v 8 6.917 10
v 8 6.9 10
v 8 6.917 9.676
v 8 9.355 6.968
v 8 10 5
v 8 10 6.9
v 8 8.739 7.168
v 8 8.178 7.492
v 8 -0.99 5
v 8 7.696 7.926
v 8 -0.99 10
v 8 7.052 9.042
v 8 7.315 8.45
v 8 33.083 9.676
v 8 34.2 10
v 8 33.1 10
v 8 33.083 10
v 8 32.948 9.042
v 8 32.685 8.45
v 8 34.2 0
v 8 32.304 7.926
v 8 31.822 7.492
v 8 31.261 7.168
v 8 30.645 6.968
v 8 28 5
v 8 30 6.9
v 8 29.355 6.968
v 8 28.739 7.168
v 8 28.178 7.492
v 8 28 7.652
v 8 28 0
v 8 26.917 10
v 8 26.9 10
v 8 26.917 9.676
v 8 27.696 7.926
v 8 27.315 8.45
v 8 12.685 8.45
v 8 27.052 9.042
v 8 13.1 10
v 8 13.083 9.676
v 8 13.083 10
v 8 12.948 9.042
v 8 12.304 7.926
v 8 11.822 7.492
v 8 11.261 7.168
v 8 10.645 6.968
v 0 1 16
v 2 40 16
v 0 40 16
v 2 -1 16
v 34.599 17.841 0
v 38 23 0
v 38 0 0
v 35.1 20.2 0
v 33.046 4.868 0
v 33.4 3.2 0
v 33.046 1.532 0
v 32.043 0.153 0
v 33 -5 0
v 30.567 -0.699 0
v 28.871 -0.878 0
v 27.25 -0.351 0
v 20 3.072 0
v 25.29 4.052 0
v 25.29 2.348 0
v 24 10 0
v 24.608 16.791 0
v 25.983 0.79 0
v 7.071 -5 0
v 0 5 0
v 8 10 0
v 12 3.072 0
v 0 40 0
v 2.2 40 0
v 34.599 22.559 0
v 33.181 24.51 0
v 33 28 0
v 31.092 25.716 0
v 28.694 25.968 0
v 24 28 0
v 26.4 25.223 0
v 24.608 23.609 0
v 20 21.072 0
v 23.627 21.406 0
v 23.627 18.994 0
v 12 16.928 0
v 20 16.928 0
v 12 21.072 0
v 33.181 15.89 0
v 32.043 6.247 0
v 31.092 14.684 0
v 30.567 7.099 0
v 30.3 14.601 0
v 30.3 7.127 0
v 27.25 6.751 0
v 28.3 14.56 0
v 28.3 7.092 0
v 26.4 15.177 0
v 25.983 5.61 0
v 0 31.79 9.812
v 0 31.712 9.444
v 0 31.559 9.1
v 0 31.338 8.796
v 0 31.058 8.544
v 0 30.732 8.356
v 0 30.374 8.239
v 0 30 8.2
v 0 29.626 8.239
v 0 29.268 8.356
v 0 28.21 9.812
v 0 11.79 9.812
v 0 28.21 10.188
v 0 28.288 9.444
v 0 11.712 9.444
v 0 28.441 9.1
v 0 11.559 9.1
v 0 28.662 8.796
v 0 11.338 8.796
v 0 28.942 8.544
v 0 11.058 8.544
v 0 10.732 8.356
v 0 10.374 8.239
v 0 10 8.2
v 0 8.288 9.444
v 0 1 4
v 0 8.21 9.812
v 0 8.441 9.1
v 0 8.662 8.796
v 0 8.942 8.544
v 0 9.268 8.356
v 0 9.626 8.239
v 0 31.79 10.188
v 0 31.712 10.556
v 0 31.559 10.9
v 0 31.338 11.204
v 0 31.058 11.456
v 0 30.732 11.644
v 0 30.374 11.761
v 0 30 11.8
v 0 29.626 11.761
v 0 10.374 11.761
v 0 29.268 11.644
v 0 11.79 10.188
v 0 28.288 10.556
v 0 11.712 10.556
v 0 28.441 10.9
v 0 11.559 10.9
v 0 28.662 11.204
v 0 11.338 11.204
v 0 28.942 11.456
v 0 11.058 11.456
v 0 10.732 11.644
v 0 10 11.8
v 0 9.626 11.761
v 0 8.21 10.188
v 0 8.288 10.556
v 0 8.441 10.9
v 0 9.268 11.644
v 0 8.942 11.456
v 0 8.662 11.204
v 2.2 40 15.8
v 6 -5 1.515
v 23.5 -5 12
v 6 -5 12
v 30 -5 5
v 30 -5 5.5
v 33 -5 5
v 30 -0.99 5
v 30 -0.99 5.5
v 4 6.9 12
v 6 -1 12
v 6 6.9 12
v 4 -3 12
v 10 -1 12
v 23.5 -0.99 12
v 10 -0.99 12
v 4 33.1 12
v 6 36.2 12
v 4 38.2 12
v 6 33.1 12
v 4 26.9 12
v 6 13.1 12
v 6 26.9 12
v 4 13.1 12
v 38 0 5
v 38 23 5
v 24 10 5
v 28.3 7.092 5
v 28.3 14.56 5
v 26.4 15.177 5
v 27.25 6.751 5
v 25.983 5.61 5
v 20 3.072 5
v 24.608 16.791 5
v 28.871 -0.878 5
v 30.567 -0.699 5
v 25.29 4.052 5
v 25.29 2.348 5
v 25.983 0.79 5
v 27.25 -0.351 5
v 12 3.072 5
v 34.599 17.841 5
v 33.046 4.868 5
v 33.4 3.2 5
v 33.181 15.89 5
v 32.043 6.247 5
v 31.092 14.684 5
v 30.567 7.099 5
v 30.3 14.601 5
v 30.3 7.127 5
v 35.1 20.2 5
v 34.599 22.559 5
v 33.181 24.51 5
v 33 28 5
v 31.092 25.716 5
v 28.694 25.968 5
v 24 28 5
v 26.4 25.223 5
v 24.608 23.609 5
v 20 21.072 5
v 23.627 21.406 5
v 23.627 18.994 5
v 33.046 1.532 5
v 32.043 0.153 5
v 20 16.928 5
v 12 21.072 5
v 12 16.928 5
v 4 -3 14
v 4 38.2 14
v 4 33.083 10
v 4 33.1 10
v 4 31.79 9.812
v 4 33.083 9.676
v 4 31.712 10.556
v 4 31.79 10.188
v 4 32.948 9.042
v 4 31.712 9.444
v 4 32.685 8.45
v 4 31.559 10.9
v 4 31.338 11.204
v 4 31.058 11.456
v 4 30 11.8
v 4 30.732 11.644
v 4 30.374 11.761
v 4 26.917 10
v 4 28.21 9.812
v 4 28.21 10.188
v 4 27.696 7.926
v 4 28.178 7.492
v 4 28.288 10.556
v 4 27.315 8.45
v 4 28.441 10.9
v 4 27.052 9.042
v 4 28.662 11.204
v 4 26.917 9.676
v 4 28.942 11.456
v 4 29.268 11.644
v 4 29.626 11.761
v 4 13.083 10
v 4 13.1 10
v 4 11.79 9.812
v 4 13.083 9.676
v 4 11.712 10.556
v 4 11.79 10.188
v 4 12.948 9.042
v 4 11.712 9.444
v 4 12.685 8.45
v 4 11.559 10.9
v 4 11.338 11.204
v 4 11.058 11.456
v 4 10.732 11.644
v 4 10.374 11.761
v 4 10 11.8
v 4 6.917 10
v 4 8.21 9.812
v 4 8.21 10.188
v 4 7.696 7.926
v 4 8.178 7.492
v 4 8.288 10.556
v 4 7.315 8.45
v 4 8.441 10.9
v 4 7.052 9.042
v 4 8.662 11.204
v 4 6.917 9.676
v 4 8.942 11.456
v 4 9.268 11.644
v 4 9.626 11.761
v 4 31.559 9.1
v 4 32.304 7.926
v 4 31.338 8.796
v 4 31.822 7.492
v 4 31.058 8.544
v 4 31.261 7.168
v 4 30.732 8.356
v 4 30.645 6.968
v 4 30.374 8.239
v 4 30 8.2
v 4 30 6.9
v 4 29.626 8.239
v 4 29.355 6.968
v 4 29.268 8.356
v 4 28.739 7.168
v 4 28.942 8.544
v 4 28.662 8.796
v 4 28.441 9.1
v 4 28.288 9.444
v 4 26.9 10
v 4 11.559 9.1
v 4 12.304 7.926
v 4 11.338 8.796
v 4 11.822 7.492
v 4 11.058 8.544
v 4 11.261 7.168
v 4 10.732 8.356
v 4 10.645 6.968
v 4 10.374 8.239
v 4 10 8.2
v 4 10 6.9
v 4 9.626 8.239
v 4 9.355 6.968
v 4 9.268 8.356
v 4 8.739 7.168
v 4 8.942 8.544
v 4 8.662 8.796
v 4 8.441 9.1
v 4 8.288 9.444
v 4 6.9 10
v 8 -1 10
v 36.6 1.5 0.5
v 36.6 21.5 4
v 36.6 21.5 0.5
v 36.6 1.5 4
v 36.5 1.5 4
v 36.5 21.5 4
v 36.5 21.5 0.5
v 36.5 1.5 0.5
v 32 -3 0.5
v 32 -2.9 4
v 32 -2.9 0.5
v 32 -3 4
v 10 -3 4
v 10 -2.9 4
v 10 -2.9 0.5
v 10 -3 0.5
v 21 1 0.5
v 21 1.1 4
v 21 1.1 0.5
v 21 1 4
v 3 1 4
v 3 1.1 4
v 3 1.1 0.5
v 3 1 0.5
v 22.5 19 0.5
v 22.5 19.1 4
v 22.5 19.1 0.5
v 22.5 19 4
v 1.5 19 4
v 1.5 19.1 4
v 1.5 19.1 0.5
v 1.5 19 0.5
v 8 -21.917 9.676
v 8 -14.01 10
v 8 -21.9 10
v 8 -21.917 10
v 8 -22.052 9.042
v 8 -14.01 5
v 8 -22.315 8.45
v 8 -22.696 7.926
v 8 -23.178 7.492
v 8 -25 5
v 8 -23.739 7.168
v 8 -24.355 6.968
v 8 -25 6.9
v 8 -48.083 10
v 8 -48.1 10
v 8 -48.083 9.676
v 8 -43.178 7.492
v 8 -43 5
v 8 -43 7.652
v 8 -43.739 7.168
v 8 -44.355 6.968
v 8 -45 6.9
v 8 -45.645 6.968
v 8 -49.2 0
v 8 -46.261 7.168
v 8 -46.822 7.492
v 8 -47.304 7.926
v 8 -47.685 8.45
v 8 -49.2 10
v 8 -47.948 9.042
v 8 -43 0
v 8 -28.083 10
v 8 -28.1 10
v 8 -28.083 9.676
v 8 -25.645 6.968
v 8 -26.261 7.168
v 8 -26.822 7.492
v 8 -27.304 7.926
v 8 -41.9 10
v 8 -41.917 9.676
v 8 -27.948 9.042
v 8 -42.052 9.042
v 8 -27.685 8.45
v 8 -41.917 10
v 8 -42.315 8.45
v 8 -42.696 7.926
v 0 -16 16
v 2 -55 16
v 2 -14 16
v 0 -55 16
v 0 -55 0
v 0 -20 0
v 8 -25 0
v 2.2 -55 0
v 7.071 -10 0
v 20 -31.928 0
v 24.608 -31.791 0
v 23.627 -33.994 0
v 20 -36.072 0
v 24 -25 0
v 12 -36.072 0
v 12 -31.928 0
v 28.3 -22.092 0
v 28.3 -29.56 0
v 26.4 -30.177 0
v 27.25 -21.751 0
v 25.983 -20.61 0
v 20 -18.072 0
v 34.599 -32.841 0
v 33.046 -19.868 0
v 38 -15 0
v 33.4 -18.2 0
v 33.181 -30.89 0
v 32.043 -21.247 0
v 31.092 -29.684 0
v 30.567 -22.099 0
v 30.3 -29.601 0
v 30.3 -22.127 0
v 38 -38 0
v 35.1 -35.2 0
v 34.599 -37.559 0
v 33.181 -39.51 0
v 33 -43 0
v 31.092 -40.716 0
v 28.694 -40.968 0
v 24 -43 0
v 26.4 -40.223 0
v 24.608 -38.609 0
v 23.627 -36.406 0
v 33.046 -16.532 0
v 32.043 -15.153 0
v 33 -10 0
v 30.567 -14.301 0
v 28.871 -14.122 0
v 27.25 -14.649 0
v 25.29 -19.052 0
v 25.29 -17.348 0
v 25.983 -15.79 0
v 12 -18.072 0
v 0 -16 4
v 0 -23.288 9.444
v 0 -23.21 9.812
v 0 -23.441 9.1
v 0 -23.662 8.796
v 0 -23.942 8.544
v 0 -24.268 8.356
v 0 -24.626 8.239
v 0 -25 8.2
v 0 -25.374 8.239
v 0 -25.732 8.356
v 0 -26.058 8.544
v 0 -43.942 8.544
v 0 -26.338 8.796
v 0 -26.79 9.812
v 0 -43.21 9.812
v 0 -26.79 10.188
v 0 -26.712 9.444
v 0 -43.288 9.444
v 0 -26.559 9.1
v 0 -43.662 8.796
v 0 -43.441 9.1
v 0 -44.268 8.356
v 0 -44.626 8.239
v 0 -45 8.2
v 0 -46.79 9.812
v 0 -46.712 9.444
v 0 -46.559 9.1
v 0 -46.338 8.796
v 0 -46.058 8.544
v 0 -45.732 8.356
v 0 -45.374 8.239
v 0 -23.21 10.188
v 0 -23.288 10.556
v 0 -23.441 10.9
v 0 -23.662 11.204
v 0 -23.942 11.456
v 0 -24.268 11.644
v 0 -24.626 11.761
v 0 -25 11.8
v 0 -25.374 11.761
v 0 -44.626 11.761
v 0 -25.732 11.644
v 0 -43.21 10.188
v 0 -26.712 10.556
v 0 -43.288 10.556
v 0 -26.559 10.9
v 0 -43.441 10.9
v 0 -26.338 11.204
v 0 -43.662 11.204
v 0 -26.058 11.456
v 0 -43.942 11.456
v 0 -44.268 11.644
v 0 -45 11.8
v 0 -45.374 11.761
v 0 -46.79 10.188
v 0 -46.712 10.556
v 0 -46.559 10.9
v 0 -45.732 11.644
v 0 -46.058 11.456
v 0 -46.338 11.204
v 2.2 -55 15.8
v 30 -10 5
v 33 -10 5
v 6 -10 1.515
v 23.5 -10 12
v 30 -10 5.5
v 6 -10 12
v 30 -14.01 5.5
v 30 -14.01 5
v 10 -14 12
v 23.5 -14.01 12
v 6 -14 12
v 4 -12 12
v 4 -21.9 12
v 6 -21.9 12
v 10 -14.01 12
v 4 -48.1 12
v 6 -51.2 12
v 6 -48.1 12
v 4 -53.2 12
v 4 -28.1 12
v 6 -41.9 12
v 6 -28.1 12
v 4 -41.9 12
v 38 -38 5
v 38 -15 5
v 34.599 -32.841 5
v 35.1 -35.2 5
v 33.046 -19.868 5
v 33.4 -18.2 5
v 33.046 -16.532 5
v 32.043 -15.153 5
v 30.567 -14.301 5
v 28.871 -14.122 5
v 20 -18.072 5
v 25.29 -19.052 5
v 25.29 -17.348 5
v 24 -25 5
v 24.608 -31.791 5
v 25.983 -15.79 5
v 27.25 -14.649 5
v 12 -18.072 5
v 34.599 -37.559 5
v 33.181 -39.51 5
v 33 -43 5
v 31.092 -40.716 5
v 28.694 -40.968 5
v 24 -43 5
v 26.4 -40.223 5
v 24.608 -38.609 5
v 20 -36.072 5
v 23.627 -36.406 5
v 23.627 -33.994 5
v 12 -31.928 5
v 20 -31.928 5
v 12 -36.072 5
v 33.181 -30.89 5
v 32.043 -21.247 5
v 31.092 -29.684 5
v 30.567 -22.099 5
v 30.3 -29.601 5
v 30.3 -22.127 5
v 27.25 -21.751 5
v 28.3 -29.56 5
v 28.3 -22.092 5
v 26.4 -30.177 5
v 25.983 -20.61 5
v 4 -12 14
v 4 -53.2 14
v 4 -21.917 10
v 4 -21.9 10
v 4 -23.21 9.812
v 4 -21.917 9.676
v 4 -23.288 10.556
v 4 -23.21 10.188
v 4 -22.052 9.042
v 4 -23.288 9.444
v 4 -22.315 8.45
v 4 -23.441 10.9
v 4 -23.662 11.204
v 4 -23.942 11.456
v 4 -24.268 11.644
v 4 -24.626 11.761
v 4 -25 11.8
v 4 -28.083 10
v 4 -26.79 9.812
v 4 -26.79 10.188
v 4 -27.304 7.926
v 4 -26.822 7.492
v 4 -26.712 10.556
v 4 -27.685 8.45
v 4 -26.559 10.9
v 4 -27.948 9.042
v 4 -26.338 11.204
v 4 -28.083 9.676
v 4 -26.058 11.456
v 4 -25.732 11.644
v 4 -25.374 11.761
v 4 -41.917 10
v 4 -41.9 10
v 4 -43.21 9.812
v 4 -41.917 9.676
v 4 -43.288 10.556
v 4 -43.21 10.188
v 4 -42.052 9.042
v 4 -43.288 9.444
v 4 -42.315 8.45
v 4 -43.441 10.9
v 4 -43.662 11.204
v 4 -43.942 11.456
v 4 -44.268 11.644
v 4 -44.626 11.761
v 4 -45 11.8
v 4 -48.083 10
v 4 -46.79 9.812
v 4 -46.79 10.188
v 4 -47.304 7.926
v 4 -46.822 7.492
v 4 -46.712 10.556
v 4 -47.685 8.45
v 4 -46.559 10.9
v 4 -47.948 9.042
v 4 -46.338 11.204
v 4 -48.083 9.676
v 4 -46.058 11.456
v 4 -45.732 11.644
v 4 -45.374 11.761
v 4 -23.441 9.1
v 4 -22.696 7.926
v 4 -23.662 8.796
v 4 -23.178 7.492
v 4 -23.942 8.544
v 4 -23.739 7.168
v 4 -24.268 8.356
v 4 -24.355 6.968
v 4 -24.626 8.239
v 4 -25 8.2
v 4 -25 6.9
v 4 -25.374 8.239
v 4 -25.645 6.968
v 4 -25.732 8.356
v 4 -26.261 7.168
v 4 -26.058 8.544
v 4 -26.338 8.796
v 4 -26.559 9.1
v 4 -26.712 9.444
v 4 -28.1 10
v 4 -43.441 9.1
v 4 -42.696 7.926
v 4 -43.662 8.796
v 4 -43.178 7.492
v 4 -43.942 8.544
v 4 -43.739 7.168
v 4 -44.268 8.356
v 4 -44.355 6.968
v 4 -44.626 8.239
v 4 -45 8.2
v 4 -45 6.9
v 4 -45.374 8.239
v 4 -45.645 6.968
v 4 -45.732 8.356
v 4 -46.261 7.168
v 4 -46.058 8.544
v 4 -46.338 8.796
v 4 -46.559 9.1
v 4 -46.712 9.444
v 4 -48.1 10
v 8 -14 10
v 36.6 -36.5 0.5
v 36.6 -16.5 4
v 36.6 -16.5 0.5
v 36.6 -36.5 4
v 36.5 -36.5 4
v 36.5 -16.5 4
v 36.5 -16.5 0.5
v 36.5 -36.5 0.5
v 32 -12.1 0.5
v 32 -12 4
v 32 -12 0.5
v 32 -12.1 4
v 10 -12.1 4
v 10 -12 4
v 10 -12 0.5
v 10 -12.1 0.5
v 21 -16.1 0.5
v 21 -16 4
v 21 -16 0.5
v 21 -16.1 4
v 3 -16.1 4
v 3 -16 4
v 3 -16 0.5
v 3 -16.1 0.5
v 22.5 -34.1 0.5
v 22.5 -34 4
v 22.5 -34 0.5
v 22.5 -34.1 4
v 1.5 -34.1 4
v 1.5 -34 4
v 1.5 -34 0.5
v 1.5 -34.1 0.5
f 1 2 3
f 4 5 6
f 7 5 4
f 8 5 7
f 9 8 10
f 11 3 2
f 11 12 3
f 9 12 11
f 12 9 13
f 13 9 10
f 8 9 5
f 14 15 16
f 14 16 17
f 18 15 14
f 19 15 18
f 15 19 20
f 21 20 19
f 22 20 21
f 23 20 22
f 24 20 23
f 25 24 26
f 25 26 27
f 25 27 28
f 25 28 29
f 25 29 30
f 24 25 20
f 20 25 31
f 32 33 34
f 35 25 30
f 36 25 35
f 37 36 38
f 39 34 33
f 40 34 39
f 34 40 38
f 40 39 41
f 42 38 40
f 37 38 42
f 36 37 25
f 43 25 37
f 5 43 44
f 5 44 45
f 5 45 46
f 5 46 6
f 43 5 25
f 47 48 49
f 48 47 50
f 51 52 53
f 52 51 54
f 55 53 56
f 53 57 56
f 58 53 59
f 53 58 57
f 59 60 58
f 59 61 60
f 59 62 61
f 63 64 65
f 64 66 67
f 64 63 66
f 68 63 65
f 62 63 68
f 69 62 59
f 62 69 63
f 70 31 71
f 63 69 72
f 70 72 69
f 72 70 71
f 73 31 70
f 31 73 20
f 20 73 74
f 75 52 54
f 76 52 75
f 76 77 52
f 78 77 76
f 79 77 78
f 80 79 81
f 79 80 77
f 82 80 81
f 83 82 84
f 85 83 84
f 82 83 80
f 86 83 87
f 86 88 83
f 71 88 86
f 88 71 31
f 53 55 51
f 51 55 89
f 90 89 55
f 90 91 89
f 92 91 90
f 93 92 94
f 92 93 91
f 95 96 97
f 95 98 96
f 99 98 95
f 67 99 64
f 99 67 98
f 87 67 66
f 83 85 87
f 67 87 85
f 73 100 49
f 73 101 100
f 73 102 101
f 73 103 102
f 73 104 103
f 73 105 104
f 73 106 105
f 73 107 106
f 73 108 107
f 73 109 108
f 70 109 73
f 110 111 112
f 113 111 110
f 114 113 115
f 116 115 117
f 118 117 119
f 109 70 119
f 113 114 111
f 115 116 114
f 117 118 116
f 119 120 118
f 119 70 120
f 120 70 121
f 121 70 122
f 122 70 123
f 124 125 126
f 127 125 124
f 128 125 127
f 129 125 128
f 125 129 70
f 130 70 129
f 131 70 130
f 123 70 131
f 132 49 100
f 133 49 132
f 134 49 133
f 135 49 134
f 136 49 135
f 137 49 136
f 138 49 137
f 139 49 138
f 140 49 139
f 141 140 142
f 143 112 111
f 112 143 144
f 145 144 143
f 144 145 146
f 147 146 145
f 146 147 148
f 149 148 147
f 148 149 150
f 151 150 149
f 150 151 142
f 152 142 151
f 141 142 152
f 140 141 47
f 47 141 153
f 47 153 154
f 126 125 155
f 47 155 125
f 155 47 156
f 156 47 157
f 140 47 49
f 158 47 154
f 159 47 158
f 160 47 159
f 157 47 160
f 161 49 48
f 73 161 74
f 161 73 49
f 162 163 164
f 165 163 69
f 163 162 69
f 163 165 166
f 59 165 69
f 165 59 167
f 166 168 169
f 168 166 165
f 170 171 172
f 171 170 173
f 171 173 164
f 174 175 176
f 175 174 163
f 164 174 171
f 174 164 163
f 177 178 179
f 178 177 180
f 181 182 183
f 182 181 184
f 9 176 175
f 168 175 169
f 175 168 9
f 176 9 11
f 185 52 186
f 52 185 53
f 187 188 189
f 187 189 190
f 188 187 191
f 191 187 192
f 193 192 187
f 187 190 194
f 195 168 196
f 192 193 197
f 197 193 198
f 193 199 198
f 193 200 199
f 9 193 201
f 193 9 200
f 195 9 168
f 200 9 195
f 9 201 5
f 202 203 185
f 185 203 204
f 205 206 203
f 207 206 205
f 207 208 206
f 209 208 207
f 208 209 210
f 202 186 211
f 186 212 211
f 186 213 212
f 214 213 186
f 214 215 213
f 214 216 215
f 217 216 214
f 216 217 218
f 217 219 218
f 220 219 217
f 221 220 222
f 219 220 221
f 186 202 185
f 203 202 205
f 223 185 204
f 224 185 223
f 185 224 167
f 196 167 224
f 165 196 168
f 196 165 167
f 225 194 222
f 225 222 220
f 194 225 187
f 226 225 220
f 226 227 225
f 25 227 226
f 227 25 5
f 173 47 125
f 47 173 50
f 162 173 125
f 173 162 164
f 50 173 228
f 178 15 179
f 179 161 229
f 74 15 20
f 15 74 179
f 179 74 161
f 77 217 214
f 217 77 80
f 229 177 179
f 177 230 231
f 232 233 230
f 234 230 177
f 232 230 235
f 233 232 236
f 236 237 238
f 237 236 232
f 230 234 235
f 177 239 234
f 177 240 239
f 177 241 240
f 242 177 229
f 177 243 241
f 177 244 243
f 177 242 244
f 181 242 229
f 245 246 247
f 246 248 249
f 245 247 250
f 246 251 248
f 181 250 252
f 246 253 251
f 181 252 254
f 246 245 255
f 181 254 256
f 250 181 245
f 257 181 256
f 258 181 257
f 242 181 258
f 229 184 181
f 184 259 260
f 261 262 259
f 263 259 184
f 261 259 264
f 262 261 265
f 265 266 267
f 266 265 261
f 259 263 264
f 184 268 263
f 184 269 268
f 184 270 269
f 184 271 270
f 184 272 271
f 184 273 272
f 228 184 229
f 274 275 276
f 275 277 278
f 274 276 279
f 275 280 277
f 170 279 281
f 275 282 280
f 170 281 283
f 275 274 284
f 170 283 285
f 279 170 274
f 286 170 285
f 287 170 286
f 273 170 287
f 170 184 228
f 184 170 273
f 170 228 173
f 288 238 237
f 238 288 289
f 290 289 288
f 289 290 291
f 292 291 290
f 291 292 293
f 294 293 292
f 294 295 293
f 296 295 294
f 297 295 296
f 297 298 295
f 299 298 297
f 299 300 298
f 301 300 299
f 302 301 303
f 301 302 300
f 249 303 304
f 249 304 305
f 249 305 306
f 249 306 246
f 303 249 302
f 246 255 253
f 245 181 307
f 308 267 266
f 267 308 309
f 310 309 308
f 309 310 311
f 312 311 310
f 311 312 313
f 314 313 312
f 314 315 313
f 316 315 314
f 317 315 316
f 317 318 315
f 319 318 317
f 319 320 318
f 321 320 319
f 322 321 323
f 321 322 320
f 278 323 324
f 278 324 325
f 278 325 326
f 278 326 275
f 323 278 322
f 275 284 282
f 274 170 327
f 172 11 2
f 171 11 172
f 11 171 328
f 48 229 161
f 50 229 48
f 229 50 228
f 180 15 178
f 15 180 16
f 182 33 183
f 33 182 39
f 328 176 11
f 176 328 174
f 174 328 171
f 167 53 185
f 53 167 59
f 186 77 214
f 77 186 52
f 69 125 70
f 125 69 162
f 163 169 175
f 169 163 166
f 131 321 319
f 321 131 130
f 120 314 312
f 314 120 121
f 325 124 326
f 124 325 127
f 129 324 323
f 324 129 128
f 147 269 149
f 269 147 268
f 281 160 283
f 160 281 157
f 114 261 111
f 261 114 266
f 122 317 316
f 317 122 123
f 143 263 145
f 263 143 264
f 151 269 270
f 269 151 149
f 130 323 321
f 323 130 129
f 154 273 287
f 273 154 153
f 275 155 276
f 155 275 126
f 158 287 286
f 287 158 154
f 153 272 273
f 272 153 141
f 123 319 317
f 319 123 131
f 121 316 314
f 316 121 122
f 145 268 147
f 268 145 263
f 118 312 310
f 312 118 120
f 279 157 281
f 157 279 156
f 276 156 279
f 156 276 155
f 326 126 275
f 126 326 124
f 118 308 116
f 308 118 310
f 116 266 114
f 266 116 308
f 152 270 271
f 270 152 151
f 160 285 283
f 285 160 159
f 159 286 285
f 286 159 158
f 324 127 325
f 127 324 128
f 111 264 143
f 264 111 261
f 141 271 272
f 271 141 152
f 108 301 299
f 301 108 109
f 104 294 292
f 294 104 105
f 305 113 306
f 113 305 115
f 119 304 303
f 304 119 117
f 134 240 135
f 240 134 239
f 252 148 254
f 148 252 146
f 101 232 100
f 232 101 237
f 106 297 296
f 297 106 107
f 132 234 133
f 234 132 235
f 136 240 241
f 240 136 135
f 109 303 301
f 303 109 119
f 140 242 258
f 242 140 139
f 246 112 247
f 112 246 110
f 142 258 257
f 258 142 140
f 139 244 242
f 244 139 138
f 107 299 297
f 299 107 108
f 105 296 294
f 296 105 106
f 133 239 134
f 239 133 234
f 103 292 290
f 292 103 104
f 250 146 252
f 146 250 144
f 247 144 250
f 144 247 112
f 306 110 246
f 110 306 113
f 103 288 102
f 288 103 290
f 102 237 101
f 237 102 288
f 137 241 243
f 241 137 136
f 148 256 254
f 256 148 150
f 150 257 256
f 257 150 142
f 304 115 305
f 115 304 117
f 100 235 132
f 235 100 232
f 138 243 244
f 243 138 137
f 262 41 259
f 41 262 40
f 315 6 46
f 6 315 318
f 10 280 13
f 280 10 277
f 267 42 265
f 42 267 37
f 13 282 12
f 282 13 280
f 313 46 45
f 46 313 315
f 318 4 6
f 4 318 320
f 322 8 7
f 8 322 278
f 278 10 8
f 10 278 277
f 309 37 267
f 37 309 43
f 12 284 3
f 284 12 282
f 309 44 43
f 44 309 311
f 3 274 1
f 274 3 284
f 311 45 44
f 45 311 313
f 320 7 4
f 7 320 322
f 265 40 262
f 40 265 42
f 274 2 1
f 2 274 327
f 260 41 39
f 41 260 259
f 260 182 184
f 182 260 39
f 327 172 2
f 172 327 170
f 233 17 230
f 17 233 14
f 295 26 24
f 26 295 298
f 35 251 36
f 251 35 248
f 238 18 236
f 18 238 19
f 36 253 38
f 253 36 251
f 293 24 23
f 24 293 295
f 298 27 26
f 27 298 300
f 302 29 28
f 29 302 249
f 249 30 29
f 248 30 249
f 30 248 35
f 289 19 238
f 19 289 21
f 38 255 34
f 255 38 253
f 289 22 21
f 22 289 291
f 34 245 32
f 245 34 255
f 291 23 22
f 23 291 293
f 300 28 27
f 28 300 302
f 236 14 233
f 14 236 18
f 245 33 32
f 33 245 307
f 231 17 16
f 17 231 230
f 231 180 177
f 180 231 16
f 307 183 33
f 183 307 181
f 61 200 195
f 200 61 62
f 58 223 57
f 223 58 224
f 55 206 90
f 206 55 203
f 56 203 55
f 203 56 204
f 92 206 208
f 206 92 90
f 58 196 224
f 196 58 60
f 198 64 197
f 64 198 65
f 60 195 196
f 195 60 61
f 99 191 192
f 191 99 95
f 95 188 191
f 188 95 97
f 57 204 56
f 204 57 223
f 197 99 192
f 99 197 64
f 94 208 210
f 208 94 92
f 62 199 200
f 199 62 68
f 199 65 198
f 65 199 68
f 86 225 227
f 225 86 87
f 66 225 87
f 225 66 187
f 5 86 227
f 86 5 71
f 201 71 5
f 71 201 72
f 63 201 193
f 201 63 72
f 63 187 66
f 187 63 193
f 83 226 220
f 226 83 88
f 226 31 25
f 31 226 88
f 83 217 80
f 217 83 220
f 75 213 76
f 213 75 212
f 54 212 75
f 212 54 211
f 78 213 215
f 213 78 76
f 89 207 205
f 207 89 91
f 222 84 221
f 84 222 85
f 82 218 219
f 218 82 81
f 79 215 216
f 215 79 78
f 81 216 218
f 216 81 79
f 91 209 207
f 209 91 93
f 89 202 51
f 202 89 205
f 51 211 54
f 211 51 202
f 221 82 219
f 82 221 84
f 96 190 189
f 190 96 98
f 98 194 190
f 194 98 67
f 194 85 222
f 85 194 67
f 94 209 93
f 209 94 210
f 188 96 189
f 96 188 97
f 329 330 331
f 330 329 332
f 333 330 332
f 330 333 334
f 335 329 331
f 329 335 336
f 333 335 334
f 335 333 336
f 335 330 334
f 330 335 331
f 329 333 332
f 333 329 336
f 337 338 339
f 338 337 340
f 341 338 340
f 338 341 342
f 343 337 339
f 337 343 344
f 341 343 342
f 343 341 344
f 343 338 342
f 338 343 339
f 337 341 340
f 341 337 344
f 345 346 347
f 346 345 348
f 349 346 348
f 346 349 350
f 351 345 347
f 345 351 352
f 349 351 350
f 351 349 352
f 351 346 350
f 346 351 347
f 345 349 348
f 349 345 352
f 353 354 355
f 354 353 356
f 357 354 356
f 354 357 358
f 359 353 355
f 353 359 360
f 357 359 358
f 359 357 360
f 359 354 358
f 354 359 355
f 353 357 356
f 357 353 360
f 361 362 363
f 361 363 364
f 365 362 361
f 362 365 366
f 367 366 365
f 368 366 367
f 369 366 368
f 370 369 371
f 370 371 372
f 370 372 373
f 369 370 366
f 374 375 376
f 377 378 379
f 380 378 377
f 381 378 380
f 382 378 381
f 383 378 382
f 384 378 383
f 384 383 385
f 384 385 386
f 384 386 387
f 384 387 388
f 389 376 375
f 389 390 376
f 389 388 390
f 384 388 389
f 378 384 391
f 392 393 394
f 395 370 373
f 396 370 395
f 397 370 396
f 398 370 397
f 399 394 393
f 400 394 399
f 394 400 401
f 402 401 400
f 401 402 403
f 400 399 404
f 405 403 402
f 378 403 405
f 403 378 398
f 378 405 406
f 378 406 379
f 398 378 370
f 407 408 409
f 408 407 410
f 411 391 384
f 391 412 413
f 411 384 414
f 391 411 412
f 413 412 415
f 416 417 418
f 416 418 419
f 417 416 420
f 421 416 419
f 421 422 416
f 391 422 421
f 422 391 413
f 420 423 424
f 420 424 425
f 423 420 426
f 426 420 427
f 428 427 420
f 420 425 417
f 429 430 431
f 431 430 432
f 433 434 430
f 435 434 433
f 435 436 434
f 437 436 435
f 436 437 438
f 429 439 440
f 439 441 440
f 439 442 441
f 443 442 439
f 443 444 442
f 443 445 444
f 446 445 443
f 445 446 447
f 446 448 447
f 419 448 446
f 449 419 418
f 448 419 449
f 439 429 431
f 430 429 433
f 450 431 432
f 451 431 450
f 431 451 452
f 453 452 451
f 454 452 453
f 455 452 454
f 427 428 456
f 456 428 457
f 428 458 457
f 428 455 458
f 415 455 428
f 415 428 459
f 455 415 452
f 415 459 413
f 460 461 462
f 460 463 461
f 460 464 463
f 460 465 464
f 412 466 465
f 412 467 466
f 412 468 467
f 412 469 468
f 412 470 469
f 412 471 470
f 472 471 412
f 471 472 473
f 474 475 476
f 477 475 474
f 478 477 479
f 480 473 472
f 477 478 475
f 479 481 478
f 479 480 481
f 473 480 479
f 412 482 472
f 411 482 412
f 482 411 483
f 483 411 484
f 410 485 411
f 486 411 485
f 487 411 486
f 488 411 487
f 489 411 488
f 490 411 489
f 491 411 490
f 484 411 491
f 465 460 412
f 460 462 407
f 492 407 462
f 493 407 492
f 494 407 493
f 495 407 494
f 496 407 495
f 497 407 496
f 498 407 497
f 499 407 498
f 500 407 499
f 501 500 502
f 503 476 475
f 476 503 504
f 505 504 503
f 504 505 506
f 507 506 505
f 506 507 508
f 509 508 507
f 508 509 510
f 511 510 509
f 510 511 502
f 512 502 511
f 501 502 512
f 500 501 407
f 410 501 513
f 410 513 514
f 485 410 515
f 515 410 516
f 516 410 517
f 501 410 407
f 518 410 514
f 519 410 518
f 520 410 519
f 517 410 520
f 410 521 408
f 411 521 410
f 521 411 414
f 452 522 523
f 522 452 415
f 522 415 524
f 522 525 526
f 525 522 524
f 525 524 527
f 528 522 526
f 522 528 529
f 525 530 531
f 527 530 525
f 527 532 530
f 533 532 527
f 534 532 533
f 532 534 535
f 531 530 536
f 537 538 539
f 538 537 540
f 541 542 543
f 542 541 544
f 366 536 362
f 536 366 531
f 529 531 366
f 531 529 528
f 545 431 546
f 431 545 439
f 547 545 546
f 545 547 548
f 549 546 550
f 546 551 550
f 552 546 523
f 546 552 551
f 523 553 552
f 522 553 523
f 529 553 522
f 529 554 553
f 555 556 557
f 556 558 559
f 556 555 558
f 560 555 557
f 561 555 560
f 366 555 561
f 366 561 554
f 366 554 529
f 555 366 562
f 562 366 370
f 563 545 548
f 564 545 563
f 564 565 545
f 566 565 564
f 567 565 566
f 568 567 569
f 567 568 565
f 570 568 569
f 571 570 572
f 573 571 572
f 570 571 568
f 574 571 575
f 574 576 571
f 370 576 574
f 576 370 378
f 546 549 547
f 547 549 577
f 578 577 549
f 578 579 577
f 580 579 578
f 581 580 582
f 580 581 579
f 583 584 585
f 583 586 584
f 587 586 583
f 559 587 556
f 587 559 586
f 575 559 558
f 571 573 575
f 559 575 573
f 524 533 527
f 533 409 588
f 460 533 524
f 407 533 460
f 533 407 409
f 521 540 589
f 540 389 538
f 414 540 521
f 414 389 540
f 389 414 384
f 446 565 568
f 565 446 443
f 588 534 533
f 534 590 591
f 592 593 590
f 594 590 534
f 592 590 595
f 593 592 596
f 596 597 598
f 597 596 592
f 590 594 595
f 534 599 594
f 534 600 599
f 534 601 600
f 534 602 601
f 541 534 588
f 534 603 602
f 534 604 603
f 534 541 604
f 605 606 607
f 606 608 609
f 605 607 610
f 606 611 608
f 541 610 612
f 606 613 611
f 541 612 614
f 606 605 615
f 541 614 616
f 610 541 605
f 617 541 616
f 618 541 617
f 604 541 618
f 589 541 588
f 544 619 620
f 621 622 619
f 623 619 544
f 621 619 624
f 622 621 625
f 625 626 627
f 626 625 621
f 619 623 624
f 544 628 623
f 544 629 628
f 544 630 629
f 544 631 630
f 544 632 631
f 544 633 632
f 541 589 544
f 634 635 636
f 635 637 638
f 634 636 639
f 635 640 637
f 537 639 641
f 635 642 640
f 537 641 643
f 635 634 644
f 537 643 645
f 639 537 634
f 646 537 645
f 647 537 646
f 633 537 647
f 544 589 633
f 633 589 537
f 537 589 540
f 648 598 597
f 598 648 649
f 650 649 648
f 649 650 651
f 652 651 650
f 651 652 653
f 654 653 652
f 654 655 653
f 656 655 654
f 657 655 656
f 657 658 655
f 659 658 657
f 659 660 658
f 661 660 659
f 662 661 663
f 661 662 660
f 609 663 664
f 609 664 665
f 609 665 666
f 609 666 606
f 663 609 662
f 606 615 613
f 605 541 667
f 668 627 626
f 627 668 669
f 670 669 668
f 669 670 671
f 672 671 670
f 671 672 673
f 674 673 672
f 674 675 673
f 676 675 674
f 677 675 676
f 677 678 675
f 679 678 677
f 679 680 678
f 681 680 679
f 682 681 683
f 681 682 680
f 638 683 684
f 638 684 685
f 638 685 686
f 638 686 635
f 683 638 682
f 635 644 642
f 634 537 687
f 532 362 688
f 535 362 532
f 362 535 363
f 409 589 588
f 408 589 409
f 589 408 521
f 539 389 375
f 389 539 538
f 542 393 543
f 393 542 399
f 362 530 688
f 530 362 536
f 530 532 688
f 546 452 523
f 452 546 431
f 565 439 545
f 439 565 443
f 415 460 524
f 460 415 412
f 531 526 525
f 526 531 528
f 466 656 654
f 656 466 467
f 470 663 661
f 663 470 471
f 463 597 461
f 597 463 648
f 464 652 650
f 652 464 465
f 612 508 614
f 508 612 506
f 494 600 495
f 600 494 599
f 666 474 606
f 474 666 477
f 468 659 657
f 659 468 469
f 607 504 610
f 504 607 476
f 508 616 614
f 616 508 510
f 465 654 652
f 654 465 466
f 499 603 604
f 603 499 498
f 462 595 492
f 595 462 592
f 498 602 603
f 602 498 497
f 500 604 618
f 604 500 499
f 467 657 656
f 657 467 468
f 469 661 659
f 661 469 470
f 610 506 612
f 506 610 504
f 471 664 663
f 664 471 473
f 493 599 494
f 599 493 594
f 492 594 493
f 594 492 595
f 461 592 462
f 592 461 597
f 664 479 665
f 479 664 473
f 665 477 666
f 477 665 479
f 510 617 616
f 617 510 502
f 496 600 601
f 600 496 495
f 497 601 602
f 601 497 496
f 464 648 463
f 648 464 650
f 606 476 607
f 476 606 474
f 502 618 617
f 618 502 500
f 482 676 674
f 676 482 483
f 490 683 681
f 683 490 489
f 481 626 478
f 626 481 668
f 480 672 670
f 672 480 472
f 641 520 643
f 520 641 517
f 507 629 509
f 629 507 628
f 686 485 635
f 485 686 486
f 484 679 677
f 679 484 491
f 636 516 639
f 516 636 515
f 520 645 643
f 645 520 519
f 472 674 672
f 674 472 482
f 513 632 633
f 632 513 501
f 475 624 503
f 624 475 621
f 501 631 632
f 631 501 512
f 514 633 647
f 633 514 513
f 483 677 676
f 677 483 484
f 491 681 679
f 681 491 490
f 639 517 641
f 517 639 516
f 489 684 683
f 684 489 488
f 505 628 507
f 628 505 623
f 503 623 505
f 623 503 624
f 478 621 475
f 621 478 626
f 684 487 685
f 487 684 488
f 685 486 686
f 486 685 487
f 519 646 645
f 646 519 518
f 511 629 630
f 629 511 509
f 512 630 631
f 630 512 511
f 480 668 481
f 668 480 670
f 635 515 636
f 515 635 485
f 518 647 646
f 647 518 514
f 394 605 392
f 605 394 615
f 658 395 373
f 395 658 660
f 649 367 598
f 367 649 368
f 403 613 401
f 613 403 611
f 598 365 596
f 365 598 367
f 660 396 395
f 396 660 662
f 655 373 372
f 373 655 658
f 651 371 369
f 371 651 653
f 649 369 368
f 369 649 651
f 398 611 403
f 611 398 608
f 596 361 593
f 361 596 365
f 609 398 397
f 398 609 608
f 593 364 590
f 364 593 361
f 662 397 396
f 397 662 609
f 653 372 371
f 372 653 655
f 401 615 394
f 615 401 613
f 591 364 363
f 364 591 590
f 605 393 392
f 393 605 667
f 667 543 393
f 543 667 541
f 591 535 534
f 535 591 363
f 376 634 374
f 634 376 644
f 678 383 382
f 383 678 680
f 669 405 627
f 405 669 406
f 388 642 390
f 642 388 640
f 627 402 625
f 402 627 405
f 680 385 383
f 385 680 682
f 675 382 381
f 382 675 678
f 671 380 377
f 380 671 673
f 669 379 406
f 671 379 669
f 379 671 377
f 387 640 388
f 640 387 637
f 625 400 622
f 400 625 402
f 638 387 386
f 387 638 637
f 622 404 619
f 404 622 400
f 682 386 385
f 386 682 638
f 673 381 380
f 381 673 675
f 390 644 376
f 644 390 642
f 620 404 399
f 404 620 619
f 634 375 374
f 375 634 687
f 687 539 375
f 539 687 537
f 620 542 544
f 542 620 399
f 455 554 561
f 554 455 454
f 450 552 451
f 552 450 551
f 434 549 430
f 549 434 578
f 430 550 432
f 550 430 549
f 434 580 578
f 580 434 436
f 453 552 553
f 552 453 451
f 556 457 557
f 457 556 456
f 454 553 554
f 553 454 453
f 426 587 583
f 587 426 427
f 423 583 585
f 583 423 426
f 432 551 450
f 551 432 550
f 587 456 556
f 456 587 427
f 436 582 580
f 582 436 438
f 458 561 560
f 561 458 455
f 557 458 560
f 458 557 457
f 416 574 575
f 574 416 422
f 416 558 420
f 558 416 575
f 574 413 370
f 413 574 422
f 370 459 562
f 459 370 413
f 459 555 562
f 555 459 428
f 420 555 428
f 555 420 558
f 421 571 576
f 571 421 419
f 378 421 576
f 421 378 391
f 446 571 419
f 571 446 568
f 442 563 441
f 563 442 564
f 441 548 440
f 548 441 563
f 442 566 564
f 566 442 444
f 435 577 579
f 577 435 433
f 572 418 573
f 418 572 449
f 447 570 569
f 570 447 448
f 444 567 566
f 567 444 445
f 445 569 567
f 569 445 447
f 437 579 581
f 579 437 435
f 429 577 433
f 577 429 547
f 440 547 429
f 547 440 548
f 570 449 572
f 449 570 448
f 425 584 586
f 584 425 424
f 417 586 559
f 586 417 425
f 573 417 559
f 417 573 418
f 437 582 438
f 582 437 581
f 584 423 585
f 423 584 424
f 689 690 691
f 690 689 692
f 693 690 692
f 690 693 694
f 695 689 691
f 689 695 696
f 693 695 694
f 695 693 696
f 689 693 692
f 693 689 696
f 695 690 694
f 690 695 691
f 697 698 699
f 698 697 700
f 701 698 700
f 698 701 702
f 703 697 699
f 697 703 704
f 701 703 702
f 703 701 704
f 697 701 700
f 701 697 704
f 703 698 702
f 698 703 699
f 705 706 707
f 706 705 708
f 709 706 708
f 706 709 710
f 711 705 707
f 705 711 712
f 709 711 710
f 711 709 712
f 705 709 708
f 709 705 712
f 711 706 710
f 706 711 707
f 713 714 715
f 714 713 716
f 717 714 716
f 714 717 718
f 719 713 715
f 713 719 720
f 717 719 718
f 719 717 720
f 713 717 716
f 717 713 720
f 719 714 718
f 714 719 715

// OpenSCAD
// PRUSA iteration3
// Z axis top holder
// GNU GPL v3
// Josef Průša <iam@josefprusa.cz> and contributors
// http://www.reprap.org/wiki/Prusa_Mendel
// http://prusamendel.org


module z_top_base(){
    translate([0,-5,0]) cube([8,45,16]); // plate touching the base
    translate([0,-5,0]) cube([30,4.01,12]); // plate touching the base
    translate([0,-5,0]) cube([38,45,5]); // plate touching the base   
}

module z_top_fancy(){
    // Corner cutouts
    translate([0.5,0.5,0])         rotate([0,0,-45-180]) translate([-15,0,-1]) cube([30,30,51]);    

    translate([-13,40+5+10.2,0])   rotate([0,0,-45-0])   translate([0,0,-1])   cube([30,30,51]); // frame side angle
    translate([8,28,0]) translate([0,0,-1]) cube([50,50,51]);       

    translate([4,0,12]) rotate([0,0, 0])    translate([0,-5,0]) cube([30,50,30]);          
    translate([6,0,12]) rotate([0,-45, 0])  translate([0,-5,0]) cube([30,50,30]);
    translate([8,4,10]) rotate([0,-45, 0])  translate([0,-5,0]) cube([30,50,30]);

    translate([38-2.5,-5+2.5,0])   rotate([0,0,-45-90]) translate([-15,0,-1]) cube([30,30,51]);         
    translate([35,26,0])           rotate([0,0,-45])    translate([-15,0,-1]) cube([30,30,51]); // outer corner
    translate([0,0,5])             rotate([45+180,0,0]) rotate([0,0,-45+90])  translate([0,0,-15]) cube([30,30,30]);

    // Stiffner cut out
    translate([30,0,5.5]) rotate([0,-45,0]) translate([0,-5,0]) cube([30,50,30]);
}

module z_top_holes(){
    // Screw holes frame
    translate([-1,10,10])      rotate([0,90,0]) cylinder(h = 20, r=1.8, $fn=30);
    translate([-1,10+20,10])   rotate([0,90,0]) cylinder(h = 20, r=1.8, $fn=30);
        

    // Screw heads
    translate([4,10,10]) rotate([0,90,0]) cylinder(h = 20, r=3.1, $fn=30);
    translate([4,10-3.1,10]) cube([10,6.2,10]);
    translate([4,10+20,10])  rotate([0,90,0]) cylinder(h = 20, r=3.1, $fn=30);
    translate([4,10+20-3.1,10]) cube([10,6.2,10]);

    // Z rod holder
    translate([25+4.3,3.2,-1]) rotate([0,0,0]) cylinder(h = 50, r=4.1, $fn=15);

    
    // material saving cut
    translate([16,10,-1]) rotate([0,0,0]) cylinder(h = 50, r=8, $fn=6);  
    translate([16,28,-1]) rotate([0,0,0]) cylinder(h = 50, r=8, $fn=6);  
    translate([25+4.3,3.2+17,-1]) rotate([0,0,0]) cylinder(h = 50, r=5.8, $fn=15); // screw hole

    translate([25+4.3-1,3,-1]) cube([2,15,7]); // it's bit up because it helps with printing
    
    //selective infill
    translate([36.5,1.5,0.5]) cube([0.1,20,3.5]);    
    translate([10,-3,0.5]) cube([22,0.1,3.5]);  
    translate([3,1,0.5]) cube([18,0.1,3.5]);    
    translate([1.5,19,0.5]) cube([21,0.1,3.5]); 
        
 
}

module z_top_right(){
    difference(){
        z_top_base();
        z_top_fancy();
        z_top_holes();
    }
}

module z_top_left(){
    translate([0,-15,0]) mirror([0,1,0]) 
    difference(){
        z_top_base();
        z_top_fancy();
        z_top_holes();
    }
}

    // Final parts
    z_top_left();
    z_top_right();
